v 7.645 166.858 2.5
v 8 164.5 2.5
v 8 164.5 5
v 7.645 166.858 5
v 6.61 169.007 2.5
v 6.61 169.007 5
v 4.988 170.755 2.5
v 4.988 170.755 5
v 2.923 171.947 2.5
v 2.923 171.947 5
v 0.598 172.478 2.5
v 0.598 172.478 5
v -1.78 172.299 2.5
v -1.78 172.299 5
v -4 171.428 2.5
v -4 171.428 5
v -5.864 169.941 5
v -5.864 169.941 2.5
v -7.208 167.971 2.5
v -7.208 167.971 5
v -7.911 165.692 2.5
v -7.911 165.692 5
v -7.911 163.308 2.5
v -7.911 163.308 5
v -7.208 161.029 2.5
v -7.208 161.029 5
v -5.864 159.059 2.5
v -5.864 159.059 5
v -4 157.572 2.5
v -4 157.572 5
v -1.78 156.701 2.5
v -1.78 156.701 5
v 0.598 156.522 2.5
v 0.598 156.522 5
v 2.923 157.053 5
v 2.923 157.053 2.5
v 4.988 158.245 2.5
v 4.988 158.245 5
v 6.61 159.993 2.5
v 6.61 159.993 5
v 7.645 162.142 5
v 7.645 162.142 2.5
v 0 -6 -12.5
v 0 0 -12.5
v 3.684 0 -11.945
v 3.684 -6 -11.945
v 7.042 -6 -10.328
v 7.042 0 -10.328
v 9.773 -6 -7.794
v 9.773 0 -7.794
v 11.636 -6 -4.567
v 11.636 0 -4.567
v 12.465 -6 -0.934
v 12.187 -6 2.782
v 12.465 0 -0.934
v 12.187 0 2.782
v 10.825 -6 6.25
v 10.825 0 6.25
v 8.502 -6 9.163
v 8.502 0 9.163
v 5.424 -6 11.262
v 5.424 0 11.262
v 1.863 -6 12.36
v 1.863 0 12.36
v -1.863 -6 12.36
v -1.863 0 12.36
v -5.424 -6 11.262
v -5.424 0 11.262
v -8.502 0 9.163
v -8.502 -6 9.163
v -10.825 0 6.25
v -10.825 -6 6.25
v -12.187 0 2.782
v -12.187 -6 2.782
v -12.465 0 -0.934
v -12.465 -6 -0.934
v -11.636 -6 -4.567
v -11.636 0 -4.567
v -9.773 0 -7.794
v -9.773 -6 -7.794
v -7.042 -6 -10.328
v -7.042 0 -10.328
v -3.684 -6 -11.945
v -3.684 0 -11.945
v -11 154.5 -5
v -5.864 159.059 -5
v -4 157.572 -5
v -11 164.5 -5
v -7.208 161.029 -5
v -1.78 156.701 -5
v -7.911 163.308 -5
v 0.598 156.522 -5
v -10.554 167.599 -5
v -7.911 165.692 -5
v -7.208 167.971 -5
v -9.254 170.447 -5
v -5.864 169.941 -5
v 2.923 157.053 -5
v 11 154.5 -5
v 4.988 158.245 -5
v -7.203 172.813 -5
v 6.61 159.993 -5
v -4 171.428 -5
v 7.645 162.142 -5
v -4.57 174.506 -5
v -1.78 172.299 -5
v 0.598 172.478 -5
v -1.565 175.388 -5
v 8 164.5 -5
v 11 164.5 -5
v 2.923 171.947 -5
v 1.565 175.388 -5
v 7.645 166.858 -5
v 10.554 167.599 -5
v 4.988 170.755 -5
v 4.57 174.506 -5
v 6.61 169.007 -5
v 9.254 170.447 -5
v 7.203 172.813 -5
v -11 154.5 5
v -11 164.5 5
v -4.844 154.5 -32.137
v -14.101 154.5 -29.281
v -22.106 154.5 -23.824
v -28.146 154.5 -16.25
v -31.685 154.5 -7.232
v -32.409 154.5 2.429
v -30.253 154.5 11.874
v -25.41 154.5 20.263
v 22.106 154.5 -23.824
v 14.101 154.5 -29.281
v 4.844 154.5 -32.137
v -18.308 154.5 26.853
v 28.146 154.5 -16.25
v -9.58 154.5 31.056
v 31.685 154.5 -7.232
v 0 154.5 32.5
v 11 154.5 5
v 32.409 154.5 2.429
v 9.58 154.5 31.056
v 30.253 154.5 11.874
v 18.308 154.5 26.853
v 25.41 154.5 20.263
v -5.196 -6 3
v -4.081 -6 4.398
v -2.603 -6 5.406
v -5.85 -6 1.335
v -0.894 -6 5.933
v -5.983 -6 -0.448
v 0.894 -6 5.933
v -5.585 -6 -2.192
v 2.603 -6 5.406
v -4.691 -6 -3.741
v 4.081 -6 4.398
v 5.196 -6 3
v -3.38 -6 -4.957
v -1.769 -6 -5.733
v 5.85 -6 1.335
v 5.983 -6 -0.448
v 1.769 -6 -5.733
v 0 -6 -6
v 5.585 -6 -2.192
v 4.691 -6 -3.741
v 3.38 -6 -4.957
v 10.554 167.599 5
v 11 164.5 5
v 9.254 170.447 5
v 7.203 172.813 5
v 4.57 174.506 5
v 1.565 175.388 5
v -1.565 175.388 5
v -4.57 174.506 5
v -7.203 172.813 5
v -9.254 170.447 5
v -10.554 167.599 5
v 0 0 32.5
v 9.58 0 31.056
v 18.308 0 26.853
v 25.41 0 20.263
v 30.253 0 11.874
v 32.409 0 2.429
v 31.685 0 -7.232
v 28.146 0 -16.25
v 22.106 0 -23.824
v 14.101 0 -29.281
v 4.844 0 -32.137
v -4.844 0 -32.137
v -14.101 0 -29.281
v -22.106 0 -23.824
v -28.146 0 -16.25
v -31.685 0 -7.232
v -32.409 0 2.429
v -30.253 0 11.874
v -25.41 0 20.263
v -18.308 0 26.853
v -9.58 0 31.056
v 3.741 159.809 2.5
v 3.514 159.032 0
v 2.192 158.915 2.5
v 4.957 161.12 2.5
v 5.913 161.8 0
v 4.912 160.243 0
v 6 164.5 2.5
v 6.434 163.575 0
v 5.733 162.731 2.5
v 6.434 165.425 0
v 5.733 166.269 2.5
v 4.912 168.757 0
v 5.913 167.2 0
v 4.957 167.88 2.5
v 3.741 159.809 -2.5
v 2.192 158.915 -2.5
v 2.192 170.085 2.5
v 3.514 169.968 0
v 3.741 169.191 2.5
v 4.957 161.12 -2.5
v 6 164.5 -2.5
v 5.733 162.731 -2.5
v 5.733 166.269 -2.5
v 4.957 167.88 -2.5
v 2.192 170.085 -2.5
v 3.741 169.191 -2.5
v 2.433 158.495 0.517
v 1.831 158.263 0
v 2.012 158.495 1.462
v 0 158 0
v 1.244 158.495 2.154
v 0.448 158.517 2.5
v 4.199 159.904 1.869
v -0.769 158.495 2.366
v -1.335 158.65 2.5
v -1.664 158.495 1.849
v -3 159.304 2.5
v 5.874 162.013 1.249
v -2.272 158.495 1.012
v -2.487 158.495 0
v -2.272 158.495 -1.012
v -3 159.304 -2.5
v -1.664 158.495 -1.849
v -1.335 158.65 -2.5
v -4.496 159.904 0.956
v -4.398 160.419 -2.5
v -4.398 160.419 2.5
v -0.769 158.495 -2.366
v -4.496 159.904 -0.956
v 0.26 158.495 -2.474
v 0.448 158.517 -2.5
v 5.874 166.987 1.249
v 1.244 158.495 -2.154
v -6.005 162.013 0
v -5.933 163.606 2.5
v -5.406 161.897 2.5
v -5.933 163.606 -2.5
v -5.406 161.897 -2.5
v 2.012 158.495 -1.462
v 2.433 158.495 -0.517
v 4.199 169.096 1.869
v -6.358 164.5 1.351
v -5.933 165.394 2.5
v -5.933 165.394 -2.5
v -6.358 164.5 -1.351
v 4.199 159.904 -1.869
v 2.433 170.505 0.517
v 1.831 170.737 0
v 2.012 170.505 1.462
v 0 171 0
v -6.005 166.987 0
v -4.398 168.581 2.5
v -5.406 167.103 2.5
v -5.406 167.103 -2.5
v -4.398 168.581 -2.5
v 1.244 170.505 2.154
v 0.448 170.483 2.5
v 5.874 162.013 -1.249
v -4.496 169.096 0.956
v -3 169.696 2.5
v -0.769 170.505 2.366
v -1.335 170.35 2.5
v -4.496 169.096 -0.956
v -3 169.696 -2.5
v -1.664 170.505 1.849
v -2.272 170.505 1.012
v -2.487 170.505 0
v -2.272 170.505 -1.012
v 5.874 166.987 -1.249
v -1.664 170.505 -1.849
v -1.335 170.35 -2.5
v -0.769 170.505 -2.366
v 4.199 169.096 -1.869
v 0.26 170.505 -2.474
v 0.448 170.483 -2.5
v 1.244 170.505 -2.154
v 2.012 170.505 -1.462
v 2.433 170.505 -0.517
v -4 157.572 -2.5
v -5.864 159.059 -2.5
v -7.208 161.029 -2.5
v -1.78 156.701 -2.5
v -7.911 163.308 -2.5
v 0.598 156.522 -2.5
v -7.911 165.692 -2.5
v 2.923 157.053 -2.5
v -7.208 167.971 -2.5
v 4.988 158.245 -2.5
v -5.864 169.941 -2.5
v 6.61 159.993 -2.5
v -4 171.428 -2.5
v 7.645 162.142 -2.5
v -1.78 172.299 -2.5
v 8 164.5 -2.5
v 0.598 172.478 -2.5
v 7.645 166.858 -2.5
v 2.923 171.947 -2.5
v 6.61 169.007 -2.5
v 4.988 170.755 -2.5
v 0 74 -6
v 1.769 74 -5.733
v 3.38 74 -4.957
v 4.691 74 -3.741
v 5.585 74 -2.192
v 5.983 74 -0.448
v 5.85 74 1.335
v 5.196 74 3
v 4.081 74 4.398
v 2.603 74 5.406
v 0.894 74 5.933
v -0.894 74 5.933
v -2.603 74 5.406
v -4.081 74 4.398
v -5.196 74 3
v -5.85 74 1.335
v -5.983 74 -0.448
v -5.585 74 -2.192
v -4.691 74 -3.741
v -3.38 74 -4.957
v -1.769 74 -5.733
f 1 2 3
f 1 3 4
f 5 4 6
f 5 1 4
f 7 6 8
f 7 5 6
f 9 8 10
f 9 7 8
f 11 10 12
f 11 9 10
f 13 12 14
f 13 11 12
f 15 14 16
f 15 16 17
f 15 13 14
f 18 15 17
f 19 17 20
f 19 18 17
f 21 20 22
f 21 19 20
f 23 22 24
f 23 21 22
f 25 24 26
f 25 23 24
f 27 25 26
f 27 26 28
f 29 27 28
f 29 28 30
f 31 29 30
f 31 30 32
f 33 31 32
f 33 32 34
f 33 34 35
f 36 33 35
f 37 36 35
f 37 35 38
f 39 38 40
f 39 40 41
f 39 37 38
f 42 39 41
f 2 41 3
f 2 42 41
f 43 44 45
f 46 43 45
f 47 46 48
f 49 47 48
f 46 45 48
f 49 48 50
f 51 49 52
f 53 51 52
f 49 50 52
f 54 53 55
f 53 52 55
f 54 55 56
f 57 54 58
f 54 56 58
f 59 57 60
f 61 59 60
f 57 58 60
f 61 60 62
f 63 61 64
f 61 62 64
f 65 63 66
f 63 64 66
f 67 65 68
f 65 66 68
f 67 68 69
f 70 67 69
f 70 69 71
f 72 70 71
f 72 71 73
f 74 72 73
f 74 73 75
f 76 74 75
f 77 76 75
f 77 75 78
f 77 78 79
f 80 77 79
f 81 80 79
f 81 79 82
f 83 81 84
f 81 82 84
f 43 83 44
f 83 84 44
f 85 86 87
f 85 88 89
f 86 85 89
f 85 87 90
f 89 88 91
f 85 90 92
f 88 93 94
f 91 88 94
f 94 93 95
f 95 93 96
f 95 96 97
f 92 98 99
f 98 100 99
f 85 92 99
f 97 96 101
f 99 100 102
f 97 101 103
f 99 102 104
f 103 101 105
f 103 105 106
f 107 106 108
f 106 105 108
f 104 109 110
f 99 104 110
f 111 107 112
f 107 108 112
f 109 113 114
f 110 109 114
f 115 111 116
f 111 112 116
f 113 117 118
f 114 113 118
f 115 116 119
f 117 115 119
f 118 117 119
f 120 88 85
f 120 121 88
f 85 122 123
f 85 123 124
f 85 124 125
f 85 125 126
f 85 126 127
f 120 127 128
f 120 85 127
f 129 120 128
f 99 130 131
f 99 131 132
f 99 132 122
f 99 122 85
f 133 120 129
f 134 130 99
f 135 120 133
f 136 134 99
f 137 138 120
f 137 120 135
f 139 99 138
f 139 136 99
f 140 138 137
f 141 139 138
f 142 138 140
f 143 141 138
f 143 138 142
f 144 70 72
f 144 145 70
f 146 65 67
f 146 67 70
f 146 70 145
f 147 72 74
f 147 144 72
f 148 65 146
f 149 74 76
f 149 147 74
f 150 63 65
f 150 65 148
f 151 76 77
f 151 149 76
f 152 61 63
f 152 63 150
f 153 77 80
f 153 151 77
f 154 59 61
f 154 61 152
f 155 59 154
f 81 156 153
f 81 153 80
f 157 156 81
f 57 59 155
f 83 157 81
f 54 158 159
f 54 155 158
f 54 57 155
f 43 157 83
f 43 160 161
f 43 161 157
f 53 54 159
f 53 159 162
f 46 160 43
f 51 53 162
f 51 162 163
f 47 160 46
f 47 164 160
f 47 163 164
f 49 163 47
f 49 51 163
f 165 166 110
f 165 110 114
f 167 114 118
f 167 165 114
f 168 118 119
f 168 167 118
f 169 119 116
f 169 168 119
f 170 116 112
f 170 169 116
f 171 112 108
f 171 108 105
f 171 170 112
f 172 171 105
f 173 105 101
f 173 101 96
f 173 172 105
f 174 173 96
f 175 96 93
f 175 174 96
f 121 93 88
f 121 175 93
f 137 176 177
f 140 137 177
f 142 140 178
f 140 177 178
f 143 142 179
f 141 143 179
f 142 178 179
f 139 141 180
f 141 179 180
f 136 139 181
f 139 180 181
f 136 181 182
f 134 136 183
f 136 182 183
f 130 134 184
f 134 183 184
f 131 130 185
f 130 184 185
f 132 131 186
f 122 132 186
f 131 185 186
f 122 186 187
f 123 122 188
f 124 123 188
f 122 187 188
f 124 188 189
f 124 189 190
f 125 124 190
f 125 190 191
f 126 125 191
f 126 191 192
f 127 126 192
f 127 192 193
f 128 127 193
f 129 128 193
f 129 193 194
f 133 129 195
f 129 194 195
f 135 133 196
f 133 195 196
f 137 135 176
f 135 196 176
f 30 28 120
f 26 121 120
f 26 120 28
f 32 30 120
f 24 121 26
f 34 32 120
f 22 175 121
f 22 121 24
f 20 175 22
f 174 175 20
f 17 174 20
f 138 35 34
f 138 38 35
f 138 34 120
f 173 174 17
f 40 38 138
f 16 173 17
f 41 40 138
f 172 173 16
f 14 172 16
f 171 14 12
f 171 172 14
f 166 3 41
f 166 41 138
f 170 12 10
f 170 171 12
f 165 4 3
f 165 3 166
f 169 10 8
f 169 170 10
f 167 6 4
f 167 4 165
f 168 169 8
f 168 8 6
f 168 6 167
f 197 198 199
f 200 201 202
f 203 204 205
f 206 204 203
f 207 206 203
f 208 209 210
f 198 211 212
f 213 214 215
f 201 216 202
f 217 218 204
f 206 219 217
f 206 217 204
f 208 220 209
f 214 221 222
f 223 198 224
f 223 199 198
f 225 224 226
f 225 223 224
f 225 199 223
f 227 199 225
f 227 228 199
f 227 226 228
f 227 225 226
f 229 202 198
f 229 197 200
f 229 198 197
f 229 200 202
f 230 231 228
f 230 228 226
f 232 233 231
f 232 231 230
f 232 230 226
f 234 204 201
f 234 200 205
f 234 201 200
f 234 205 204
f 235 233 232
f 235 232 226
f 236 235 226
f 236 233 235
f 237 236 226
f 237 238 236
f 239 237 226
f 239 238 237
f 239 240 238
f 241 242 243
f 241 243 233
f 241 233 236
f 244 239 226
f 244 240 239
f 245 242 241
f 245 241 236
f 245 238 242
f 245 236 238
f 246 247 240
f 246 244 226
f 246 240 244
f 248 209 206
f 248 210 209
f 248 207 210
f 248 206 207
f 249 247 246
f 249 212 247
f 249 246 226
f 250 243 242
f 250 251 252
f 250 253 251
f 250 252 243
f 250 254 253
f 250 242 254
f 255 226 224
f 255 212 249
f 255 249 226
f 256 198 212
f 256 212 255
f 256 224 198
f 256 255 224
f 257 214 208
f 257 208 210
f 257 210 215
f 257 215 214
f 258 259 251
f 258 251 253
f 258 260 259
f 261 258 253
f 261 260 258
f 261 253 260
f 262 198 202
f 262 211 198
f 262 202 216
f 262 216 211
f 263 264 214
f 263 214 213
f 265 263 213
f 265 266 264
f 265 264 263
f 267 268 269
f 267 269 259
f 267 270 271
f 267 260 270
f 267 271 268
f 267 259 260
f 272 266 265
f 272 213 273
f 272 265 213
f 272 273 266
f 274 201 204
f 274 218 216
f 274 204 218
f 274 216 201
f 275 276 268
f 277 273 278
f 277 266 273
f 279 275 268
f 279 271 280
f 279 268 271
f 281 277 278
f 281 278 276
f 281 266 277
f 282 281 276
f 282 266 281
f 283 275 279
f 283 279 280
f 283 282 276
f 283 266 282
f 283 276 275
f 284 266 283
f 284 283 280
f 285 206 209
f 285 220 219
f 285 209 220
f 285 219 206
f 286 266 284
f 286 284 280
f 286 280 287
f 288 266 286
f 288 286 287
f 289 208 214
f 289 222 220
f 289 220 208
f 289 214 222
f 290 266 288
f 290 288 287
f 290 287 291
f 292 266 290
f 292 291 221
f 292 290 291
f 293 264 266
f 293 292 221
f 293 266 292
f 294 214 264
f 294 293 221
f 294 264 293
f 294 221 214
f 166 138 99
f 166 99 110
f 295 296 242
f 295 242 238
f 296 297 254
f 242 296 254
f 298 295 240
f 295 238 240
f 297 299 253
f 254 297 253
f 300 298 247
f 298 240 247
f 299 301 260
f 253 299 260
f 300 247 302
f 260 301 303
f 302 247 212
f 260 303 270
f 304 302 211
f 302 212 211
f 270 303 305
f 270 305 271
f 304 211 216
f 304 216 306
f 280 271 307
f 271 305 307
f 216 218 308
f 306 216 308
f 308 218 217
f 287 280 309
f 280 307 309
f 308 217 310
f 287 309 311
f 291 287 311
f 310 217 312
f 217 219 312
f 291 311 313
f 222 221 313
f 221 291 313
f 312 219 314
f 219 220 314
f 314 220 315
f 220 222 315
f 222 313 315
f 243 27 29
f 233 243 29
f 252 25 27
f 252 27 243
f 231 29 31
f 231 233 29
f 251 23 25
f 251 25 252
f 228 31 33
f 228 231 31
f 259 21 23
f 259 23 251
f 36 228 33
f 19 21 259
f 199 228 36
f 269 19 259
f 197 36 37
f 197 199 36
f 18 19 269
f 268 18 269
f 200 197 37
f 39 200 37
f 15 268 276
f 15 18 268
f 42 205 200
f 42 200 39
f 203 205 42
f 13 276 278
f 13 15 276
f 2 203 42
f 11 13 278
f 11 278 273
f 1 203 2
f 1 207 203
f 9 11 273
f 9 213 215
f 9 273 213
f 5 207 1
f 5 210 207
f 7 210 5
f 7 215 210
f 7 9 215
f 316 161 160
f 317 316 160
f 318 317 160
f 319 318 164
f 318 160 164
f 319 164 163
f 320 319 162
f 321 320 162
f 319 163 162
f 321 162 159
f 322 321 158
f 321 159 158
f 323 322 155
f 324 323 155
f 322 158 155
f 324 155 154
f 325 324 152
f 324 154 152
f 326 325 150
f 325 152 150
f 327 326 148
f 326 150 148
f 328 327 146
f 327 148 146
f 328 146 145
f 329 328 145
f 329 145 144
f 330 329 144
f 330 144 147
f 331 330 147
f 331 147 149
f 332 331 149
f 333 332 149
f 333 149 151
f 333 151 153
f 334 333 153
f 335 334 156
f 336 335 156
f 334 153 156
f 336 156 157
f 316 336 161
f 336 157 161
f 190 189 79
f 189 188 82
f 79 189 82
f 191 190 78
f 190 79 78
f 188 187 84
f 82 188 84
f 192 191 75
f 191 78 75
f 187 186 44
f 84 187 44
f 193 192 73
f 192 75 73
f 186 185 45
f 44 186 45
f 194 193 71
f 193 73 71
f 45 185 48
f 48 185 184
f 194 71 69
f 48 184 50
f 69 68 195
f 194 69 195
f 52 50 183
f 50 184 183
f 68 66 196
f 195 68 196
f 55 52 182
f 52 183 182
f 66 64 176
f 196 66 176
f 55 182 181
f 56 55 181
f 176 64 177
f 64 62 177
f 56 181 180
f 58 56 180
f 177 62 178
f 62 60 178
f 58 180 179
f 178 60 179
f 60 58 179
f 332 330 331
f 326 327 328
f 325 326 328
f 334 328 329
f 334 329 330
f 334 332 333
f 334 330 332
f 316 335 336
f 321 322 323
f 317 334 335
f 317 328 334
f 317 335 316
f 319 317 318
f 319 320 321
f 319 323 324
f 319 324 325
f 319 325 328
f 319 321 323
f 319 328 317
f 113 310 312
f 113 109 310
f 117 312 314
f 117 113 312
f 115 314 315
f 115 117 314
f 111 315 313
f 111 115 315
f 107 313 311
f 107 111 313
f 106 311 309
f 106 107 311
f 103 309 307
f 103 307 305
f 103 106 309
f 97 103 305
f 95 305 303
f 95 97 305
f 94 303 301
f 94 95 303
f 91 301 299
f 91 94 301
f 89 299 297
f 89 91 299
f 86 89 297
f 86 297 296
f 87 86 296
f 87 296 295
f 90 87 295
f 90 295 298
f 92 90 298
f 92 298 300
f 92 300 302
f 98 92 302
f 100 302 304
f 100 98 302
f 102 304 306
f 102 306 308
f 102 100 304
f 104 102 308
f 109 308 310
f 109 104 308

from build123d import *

# Parameters (mm, degrees)
SKETCH_1_R          = 32.5
EXTRUDE_1_DEPTH     = 154.5
SKETCH_2_R          = 12.5
EXTRUDE_2_DEPTH     = 6
SKETCH_3_R          = 6
CUT_EXTRUDE_1_DEPTH = 80
SKETCH_4_R          = 8
EXTRUDE_3_DEPTH     = 5
SKETCH_5_R          = 8
EXTRUDE_4_DEPTH     = 2.5
SKETCH_8_R          = 4
SKETCH_7_R          = 6
SKETCH_9_R          = 2.5
CUT_EXTRUDE_2_DEPTH = 31
SKETCH_10_R         = 6
CUT_EXTRUDE_3_DEPTH = 17


with BuildPart() as part:
    # 草图1 → 凸台-拉伸1 (new body)
    with BuildSketch(Plane(origin=(0, 0, 0), x_dir=(1, 0, 0), z_dir=(0, 1, 0))):
        with Locations(Location((0, 0, 0), (0, 0, 270))):
            Circle(SKETCH_1_R)
    extrude(amount=EXTRUDE_1_DEPTH)

    # 草图2 → 凸台-拉伸2 (add)
    with BuildSketch(Plane.XZ):
        with Locations(Location((0, 0, 0), (0, 0, 270))):
            Circle(SKETCH_2_R)
    extrude(amount=EXTRUDE_2_DEPTH)

    # 草图3 → 切除-拉伸1 (cut)
    with BuildSketch(Plane.XZ.offset(6)):
        with Locations(Location((0, 0, 0), (0, 0, 270))):
            Circle(SKETCH_3_R)
    extrude(amount=-CUT_EXTRUDE_1_DEPTH, mode=Mode.SUBTRACT)

    # 草图4 → 凸台-拉伸3 (add, symmetric)
    with BuildSketch(Plane.XY):
        with BuildLine():
            Line((-11, 154.5), (11, 154.5))
            Line((11, 154.5), (11, 164.5))
            ThreePointArc((11, 164.5), (0, 175.5), (-11, 164.5))
            Line((-11, 164.5), (-11, 154.5))
        make_face()
        with Locations((0, 164.5)):
            Circle(SKETCH_4_R, mode=Mode.SUBTRACT)
    extrude(amount=EXTRUDE_3_DEPTH, both=True)

    # 草图5 → 凸台-拉伸4 (add, symmetric)
    with BuildSketch(Plane.XY):
        with Locations((0, 164.5)):
            Circle(SKETCH_5_R)
    extrude(amount=EXTRUDE_4_DEPTH, both=True)

    # 草图8 → 放样1 section 0
    with BuildSketch(Plane.XY.offset(4.5)):
        with Locations((0, 164.5)):
            Circle(SKETCH_8_R)
    # 草图7 → 放样1 section 1
    with BuildSketch(Plane.XY.offset(2.5)):
        with Locations((0, 164.5)):
            Circle(SKETCH_7_R)
    loft_1 = loft()

    # 镜向1: 放样1 across plane
    add(loft_1.mirror(Plane.XY))

    # 草图9 → 切除-拉伸2 (cut)
    with BuildSketch(Plane.XY.offset(4.5)):
        with Locations((0, 166.761335751)):
            Circle(SKETCH_9_R)
    extrude(amount=-CUT_EXTRUDE_2_DEPTH, mode=Mode.SUBTRACT)

    # 草图10 → 切除-拉伸3 (cut)
    with BuildSketch(Plane.XY.offset(4.5)):
        with Locations((0, 164.5)):
            Circle(SKETCH_10_R)
    extrude(amount=-CUT_EXTRUDE_3_DEPTH, mode=Mode.SUBTRACT)

    # 草图11 → 切除-旋转1 (revolve, cut)
    with BuildSketch(Plane.XY):
        with BuildLine():
            Line((0, 171), (0, 158))
            ThreePointArc((0, 158), (6.5, 164.5), (0, 171))
        make_face()
    revolve(axis=Axis((0, 171, 0), (0, -1, 0)), mode=Mode.SUBTRACT)


solid = part.part
